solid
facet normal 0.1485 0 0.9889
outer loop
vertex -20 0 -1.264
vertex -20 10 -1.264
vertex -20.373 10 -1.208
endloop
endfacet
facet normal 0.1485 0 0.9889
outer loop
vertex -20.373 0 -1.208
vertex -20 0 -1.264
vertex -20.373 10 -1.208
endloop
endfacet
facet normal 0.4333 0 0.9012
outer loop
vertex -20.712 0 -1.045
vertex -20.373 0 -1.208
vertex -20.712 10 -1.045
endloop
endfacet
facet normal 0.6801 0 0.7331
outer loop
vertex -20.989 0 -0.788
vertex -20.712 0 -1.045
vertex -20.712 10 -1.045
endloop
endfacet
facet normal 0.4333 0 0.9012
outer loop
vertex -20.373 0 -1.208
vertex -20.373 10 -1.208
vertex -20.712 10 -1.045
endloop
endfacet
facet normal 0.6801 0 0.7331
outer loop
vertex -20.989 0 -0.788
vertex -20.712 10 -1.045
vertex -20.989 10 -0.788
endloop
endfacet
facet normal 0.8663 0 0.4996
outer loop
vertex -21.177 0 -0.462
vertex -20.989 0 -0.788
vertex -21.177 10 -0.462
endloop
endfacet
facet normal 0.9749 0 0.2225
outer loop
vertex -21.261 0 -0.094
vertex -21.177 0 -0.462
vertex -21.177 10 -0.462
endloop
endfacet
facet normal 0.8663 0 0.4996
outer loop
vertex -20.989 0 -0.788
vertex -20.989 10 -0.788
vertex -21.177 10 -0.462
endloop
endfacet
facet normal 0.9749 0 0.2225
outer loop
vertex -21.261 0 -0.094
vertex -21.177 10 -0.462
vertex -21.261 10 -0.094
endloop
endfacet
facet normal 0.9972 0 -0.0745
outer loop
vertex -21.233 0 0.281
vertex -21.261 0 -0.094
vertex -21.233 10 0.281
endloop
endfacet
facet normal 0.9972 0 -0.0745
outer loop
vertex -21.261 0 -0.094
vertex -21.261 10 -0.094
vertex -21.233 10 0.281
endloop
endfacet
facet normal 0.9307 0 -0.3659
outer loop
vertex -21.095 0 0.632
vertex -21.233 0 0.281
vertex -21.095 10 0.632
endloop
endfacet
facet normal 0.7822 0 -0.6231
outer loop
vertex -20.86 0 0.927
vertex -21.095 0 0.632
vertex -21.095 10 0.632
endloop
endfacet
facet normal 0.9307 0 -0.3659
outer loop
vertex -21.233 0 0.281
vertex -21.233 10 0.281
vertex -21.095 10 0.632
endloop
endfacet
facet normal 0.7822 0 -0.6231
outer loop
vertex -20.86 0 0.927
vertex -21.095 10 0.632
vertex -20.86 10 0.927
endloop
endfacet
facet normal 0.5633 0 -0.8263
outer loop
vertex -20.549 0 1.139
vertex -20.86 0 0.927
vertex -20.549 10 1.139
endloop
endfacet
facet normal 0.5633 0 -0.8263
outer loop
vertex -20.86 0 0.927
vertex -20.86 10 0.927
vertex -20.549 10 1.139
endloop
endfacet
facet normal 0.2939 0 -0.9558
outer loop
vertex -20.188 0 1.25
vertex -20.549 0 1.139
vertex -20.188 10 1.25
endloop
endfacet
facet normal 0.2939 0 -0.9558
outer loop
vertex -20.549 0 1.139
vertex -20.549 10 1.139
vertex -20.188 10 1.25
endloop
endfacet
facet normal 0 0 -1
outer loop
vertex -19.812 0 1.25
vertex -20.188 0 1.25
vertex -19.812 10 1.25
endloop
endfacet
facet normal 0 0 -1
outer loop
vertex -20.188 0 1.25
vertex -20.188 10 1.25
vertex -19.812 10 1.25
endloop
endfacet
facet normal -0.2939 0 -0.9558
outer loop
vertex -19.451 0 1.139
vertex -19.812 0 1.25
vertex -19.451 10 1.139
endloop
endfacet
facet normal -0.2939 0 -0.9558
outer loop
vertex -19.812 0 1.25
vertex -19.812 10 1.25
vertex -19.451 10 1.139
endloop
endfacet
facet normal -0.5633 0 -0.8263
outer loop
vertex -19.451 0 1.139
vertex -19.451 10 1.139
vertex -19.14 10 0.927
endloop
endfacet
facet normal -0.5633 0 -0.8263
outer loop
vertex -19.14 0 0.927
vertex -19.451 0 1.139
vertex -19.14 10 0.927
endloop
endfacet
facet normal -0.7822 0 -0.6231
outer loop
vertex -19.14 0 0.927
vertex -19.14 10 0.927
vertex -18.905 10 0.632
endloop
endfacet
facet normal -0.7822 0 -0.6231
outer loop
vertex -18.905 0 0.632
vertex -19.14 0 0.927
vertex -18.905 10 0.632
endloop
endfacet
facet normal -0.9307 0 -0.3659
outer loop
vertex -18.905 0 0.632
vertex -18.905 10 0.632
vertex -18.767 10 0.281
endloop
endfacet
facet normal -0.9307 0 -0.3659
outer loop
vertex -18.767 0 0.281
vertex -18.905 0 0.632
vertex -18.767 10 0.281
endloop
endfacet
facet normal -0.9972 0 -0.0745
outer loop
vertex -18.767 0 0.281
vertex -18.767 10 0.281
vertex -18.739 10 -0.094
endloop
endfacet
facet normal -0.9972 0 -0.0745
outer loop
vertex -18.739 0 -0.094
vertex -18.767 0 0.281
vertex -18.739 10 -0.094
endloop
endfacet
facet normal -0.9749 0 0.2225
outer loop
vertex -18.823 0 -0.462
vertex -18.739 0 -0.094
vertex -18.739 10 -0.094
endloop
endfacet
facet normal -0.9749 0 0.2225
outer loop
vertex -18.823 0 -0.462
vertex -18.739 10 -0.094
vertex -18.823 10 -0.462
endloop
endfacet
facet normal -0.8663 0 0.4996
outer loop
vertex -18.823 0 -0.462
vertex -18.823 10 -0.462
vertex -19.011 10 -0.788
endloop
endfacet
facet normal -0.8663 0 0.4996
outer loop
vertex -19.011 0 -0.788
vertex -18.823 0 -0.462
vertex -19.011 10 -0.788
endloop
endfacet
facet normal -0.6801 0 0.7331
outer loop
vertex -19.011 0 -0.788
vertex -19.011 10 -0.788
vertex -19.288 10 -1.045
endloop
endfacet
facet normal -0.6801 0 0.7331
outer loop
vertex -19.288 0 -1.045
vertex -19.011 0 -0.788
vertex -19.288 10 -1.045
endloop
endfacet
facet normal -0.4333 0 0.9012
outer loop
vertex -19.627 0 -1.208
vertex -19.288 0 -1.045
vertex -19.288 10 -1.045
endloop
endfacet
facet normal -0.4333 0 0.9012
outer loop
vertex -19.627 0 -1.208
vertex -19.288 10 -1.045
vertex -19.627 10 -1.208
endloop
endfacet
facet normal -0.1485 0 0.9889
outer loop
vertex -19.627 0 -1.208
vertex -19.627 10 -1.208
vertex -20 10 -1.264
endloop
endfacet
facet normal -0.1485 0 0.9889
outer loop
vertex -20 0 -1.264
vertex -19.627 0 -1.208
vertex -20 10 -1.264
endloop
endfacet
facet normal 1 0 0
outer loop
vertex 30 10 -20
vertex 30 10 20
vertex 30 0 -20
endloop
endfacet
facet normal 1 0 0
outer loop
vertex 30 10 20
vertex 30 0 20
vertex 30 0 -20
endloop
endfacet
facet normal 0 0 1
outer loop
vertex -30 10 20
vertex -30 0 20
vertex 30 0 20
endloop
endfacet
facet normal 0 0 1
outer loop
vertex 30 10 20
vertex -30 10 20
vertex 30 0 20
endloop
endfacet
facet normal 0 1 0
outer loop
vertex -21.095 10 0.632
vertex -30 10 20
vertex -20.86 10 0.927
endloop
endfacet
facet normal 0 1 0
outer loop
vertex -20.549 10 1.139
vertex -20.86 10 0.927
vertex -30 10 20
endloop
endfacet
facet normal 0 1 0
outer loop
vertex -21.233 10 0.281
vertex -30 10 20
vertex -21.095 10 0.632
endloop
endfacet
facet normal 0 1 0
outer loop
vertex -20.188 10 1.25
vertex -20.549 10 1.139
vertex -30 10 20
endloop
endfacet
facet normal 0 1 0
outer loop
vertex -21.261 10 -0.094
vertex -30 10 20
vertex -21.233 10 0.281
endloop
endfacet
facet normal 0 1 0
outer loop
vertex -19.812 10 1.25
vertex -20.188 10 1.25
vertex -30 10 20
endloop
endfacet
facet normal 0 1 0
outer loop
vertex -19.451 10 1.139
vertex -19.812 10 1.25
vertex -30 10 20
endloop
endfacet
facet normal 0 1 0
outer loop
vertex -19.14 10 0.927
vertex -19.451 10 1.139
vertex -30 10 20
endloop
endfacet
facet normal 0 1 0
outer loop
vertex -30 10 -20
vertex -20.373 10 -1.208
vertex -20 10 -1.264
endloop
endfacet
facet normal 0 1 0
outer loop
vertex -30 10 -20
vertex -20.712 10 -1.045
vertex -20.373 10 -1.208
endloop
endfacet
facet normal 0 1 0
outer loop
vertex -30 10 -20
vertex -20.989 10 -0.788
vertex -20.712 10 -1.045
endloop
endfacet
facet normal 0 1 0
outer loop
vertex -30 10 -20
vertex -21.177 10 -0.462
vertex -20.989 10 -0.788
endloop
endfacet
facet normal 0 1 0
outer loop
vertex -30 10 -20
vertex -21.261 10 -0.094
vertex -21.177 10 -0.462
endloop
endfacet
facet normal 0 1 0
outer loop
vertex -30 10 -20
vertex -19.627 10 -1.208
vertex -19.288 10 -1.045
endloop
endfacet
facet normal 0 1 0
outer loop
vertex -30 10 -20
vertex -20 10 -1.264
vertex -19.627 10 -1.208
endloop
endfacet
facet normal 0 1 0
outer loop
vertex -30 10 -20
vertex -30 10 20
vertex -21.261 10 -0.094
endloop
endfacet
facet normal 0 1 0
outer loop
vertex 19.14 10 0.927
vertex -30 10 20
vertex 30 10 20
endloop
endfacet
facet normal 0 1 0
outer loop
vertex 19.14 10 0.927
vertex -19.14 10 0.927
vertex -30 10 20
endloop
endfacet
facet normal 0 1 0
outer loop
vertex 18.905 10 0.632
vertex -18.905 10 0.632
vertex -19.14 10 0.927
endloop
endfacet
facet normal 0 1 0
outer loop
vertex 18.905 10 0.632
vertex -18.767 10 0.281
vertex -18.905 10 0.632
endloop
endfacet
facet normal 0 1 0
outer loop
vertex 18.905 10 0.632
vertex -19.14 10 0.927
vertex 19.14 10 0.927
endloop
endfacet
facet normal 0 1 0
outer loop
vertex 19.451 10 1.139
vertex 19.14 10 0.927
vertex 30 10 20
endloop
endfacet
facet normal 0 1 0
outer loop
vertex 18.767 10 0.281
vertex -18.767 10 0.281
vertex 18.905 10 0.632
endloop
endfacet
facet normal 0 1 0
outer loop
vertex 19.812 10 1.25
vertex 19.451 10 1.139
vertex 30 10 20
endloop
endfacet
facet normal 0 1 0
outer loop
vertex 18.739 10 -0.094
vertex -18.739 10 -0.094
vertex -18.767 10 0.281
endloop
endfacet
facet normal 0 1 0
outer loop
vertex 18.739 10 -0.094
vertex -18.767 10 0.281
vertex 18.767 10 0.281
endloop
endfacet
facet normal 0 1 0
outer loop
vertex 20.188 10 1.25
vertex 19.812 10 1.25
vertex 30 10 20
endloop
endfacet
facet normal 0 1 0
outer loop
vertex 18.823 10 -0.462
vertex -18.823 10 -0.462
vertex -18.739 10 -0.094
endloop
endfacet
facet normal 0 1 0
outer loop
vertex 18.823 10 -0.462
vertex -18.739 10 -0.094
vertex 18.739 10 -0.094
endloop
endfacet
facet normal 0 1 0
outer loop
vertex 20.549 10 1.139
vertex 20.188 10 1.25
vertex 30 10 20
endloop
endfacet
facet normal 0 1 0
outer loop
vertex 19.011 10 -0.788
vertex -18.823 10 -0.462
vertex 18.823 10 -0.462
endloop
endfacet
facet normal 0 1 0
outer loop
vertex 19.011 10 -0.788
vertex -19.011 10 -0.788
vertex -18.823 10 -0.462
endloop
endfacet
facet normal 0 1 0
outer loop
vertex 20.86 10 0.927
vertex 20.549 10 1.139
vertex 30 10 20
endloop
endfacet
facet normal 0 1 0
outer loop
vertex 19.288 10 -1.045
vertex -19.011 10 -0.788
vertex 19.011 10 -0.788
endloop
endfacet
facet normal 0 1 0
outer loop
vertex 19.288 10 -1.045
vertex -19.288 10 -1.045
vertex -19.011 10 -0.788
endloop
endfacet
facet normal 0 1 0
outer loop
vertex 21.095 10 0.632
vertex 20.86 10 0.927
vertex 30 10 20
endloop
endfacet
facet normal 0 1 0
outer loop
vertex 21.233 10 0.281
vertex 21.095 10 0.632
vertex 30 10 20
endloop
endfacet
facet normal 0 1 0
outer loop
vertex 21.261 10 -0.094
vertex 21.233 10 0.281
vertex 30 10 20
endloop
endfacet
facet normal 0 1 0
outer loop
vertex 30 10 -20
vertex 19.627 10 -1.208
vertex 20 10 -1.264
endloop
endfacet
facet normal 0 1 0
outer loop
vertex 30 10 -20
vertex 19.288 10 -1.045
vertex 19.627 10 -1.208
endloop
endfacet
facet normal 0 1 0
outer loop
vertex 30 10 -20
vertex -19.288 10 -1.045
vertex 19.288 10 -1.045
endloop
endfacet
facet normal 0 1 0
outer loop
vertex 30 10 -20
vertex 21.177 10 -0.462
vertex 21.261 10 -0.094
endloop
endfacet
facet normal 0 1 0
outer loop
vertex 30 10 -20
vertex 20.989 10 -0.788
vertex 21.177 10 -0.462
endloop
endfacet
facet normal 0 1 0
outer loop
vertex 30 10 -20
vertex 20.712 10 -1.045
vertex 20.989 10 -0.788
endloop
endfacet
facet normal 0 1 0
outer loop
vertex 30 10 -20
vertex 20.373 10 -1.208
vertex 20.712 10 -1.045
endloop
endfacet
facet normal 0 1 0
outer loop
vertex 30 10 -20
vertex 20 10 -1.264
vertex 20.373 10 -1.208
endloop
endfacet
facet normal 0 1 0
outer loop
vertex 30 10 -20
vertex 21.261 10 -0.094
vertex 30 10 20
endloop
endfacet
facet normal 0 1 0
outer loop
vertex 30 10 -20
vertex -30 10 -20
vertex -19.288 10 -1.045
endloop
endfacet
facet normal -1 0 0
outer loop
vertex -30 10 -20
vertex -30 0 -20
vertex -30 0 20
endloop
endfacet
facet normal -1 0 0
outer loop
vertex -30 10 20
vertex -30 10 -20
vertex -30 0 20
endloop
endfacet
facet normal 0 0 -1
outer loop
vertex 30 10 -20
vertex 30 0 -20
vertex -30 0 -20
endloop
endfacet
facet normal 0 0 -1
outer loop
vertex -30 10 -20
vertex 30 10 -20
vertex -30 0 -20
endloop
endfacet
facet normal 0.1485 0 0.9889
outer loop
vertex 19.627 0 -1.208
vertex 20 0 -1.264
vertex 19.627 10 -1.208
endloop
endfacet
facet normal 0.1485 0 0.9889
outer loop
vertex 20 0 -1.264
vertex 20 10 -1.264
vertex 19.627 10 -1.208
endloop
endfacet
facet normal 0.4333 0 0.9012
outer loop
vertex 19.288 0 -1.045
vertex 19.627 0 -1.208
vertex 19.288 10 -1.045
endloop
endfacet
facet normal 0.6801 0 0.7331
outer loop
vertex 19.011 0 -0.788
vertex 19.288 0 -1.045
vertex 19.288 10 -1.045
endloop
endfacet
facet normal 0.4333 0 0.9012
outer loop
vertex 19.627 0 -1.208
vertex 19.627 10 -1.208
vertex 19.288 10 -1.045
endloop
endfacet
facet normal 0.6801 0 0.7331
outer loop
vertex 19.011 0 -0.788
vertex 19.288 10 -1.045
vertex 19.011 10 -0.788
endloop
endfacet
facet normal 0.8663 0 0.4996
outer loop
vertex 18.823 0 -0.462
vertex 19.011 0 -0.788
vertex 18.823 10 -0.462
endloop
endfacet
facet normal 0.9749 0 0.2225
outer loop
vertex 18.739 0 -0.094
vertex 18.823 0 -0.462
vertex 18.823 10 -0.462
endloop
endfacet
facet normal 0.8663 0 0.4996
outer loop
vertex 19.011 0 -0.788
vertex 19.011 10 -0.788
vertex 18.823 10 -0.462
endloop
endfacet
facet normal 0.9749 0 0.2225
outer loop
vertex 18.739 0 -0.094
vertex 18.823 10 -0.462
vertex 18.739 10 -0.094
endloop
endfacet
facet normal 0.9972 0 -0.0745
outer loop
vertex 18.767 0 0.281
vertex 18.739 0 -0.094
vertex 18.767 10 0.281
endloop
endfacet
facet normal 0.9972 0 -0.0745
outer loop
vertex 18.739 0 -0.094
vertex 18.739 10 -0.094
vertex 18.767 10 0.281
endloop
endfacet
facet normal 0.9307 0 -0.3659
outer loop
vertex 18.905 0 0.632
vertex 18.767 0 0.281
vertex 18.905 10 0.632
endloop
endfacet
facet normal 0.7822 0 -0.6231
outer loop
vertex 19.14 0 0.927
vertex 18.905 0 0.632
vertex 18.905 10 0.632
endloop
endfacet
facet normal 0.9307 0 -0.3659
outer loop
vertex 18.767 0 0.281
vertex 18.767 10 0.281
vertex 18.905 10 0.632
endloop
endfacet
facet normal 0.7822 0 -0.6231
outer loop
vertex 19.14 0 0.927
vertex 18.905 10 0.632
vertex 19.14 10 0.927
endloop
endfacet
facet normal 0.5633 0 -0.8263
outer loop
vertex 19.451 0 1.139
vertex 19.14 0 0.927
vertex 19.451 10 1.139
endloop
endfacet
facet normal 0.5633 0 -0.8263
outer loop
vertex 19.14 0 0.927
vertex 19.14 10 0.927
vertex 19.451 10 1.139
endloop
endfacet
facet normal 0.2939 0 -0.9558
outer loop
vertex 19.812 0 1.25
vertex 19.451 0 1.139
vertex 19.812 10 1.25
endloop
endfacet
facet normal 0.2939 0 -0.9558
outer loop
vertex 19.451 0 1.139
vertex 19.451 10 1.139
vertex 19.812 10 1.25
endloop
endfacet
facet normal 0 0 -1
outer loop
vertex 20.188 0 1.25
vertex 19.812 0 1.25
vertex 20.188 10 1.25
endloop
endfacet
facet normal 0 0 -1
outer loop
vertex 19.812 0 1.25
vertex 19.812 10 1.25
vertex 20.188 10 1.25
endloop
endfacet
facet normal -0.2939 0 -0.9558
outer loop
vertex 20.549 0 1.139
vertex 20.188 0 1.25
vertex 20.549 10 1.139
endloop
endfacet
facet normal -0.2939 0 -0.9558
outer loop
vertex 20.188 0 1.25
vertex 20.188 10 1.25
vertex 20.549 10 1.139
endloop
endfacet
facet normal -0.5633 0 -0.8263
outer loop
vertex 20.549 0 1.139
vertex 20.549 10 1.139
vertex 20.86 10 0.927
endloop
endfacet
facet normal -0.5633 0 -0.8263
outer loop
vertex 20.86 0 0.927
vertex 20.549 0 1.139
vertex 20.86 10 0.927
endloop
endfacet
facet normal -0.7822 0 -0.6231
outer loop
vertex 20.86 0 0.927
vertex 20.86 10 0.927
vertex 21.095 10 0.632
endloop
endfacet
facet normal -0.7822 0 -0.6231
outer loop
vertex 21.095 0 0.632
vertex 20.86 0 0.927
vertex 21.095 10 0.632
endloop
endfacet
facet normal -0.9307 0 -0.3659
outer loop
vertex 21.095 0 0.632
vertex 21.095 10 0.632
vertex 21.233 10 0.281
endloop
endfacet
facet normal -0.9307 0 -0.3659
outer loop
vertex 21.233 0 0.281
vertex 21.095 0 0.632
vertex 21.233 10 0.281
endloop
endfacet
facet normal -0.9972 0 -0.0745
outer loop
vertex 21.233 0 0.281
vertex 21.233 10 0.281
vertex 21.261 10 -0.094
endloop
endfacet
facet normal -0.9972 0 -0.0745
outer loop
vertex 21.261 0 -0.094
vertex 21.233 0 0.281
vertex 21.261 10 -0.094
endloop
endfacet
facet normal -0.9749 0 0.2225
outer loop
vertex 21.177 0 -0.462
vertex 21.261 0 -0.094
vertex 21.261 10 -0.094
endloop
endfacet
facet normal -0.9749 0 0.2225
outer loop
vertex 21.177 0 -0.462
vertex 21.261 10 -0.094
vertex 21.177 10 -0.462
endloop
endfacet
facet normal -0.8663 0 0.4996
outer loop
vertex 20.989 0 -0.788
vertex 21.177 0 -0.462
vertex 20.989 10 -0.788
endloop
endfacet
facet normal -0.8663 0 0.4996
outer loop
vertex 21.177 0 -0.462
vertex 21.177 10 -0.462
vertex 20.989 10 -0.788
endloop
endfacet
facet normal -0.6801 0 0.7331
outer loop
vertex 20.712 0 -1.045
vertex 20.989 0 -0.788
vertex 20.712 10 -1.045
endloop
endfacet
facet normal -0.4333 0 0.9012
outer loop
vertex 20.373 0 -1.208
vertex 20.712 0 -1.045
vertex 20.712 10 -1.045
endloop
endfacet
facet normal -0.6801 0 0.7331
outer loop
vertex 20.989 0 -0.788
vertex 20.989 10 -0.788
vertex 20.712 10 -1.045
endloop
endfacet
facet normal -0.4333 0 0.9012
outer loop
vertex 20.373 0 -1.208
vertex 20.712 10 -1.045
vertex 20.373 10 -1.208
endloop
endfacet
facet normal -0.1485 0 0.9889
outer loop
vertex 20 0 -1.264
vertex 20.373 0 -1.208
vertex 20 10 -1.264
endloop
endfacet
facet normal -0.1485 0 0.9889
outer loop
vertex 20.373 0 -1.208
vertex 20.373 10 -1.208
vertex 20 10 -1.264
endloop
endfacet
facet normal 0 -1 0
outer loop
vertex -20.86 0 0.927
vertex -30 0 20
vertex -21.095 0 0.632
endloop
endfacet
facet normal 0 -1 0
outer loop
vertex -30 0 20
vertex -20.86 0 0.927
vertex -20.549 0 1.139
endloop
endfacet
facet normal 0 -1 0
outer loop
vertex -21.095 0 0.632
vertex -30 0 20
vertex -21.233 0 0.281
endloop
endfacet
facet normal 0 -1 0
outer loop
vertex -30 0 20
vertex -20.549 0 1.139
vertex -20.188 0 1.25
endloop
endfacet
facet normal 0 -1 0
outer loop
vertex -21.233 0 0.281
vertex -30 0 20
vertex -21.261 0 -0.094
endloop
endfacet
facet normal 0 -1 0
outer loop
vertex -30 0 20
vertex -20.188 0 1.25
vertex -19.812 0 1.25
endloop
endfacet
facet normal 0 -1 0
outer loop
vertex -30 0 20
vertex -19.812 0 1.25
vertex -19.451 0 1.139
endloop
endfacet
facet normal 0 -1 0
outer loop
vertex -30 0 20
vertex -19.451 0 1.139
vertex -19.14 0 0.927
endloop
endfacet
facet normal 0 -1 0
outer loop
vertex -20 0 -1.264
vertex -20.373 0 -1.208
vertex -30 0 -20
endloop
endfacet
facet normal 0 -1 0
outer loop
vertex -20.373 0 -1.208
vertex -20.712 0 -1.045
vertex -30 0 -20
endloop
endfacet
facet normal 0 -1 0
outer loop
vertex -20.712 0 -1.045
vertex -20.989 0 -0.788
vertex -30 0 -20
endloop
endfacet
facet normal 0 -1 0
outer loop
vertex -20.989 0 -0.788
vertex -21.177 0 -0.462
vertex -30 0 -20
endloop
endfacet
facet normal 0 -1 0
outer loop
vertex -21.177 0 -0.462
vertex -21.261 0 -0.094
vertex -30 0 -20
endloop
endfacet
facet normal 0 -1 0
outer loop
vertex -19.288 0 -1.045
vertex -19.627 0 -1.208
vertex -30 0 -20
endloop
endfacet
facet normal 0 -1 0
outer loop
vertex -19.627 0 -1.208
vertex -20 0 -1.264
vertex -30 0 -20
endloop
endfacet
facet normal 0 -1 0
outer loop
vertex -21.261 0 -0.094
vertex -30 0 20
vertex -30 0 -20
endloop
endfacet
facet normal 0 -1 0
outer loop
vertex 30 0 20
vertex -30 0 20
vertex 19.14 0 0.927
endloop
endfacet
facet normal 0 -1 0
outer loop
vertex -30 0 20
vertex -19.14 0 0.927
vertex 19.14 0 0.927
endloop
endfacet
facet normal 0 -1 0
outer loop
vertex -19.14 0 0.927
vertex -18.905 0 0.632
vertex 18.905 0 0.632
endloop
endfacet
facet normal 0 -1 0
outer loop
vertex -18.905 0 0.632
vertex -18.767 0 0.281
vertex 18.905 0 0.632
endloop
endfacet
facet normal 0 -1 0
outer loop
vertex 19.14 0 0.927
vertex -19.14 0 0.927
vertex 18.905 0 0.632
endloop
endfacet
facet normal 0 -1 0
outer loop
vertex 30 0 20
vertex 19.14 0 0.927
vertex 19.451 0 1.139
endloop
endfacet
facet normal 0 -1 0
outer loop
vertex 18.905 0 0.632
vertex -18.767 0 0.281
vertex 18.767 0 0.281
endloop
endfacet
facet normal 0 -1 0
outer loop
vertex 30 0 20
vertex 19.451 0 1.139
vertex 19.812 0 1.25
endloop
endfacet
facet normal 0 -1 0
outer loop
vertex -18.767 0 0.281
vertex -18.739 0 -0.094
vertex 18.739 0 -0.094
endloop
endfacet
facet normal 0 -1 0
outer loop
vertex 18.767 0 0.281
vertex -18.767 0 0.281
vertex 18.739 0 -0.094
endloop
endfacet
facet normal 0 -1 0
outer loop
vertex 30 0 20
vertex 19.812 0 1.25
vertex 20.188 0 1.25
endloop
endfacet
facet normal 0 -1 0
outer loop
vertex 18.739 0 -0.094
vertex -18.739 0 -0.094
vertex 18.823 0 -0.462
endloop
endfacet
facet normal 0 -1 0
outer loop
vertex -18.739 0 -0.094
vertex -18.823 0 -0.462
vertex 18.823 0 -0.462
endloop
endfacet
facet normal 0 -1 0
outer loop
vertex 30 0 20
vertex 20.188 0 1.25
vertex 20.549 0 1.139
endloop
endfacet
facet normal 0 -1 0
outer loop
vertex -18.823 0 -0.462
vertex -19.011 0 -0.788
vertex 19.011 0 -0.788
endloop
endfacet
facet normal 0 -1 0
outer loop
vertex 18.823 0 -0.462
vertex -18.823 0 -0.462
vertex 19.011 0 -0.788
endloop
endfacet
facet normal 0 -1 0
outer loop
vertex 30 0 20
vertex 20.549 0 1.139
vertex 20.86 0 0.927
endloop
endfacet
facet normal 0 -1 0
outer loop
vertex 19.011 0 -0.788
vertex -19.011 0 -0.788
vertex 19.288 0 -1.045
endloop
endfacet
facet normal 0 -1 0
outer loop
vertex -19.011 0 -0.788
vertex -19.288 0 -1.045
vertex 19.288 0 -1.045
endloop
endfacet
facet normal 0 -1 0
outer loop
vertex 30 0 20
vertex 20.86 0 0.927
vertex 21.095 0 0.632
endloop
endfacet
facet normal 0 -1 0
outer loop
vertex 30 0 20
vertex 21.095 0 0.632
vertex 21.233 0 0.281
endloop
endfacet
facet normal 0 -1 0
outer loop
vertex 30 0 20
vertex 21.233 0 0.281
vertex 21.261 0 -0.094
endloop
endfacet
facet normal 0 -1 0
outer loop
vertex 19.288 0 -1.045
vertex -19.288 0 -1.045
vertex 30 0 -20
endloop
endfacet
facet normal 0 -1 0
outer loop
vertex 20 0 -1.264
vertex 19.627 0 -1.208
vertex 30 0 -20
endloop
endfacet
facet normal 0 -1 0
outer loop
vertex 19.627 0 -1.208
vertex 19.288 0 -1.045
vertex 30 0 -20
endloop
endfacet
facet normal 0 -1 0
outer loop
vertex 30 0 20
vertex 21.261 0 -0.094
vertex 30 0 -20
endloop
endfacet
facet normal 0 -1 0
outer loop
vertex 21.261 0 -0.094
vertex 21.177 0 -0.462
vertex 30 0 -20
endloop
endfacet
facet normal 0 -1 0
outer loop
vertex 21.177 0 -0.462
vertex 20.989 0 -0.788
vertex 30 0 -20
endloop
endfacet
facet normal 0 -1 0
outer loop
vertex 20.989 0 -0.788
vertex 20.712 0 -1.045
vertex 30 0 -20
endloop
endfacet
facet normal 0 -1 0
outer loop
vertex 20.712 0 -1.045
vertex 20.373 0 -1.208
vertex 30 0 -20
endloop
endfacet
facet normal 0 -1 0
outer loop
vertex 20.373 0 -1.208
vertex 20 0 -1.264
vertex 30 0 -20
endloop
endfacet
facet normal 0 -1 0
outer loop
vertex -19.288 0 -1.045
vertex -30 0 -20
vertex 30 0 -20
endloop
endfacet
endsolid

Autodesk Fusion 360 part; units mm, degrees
sketch "スケッチ1" plane through (0, 0, 0) normal (0, 1, 0) x (1, 0, 0)
  line L0 (30, 20) -> (-30, 20)
  line L1 (-30, 20) -> (-30, -20)
  line L2 (-30, -20) -> (30, -20)
  line L3 (30, -20) -> (30, 20)
  line L4 (30, 20) -> (-30, -20) construction
  line L5 (-30, 20) -> (30, -20) construction
  line L6 (-20, 0) -> (20, 0)
  dimension "d1" = 60
  dimension "d2" = 40
  dimension "d3" = 40
extrude "押し出し1" add sketch "スケッチ1" along normal blind 10
hole "穴1" at (-20, 0, 0) at (20, 0, 0) direction (0, 1, 0) diameter 3 depth 12 tip angle 118
thread "ねじ1" "ISO Metric profile 3.0 M3x0.5 6H" major diameter 3.086 minor diameter 2.529 pitch 0.5 angle 60 resizes the face on face at (20.0748, 3.3333, -1.4981) on face at (-19.9252, 3.3333, -1.4981)
